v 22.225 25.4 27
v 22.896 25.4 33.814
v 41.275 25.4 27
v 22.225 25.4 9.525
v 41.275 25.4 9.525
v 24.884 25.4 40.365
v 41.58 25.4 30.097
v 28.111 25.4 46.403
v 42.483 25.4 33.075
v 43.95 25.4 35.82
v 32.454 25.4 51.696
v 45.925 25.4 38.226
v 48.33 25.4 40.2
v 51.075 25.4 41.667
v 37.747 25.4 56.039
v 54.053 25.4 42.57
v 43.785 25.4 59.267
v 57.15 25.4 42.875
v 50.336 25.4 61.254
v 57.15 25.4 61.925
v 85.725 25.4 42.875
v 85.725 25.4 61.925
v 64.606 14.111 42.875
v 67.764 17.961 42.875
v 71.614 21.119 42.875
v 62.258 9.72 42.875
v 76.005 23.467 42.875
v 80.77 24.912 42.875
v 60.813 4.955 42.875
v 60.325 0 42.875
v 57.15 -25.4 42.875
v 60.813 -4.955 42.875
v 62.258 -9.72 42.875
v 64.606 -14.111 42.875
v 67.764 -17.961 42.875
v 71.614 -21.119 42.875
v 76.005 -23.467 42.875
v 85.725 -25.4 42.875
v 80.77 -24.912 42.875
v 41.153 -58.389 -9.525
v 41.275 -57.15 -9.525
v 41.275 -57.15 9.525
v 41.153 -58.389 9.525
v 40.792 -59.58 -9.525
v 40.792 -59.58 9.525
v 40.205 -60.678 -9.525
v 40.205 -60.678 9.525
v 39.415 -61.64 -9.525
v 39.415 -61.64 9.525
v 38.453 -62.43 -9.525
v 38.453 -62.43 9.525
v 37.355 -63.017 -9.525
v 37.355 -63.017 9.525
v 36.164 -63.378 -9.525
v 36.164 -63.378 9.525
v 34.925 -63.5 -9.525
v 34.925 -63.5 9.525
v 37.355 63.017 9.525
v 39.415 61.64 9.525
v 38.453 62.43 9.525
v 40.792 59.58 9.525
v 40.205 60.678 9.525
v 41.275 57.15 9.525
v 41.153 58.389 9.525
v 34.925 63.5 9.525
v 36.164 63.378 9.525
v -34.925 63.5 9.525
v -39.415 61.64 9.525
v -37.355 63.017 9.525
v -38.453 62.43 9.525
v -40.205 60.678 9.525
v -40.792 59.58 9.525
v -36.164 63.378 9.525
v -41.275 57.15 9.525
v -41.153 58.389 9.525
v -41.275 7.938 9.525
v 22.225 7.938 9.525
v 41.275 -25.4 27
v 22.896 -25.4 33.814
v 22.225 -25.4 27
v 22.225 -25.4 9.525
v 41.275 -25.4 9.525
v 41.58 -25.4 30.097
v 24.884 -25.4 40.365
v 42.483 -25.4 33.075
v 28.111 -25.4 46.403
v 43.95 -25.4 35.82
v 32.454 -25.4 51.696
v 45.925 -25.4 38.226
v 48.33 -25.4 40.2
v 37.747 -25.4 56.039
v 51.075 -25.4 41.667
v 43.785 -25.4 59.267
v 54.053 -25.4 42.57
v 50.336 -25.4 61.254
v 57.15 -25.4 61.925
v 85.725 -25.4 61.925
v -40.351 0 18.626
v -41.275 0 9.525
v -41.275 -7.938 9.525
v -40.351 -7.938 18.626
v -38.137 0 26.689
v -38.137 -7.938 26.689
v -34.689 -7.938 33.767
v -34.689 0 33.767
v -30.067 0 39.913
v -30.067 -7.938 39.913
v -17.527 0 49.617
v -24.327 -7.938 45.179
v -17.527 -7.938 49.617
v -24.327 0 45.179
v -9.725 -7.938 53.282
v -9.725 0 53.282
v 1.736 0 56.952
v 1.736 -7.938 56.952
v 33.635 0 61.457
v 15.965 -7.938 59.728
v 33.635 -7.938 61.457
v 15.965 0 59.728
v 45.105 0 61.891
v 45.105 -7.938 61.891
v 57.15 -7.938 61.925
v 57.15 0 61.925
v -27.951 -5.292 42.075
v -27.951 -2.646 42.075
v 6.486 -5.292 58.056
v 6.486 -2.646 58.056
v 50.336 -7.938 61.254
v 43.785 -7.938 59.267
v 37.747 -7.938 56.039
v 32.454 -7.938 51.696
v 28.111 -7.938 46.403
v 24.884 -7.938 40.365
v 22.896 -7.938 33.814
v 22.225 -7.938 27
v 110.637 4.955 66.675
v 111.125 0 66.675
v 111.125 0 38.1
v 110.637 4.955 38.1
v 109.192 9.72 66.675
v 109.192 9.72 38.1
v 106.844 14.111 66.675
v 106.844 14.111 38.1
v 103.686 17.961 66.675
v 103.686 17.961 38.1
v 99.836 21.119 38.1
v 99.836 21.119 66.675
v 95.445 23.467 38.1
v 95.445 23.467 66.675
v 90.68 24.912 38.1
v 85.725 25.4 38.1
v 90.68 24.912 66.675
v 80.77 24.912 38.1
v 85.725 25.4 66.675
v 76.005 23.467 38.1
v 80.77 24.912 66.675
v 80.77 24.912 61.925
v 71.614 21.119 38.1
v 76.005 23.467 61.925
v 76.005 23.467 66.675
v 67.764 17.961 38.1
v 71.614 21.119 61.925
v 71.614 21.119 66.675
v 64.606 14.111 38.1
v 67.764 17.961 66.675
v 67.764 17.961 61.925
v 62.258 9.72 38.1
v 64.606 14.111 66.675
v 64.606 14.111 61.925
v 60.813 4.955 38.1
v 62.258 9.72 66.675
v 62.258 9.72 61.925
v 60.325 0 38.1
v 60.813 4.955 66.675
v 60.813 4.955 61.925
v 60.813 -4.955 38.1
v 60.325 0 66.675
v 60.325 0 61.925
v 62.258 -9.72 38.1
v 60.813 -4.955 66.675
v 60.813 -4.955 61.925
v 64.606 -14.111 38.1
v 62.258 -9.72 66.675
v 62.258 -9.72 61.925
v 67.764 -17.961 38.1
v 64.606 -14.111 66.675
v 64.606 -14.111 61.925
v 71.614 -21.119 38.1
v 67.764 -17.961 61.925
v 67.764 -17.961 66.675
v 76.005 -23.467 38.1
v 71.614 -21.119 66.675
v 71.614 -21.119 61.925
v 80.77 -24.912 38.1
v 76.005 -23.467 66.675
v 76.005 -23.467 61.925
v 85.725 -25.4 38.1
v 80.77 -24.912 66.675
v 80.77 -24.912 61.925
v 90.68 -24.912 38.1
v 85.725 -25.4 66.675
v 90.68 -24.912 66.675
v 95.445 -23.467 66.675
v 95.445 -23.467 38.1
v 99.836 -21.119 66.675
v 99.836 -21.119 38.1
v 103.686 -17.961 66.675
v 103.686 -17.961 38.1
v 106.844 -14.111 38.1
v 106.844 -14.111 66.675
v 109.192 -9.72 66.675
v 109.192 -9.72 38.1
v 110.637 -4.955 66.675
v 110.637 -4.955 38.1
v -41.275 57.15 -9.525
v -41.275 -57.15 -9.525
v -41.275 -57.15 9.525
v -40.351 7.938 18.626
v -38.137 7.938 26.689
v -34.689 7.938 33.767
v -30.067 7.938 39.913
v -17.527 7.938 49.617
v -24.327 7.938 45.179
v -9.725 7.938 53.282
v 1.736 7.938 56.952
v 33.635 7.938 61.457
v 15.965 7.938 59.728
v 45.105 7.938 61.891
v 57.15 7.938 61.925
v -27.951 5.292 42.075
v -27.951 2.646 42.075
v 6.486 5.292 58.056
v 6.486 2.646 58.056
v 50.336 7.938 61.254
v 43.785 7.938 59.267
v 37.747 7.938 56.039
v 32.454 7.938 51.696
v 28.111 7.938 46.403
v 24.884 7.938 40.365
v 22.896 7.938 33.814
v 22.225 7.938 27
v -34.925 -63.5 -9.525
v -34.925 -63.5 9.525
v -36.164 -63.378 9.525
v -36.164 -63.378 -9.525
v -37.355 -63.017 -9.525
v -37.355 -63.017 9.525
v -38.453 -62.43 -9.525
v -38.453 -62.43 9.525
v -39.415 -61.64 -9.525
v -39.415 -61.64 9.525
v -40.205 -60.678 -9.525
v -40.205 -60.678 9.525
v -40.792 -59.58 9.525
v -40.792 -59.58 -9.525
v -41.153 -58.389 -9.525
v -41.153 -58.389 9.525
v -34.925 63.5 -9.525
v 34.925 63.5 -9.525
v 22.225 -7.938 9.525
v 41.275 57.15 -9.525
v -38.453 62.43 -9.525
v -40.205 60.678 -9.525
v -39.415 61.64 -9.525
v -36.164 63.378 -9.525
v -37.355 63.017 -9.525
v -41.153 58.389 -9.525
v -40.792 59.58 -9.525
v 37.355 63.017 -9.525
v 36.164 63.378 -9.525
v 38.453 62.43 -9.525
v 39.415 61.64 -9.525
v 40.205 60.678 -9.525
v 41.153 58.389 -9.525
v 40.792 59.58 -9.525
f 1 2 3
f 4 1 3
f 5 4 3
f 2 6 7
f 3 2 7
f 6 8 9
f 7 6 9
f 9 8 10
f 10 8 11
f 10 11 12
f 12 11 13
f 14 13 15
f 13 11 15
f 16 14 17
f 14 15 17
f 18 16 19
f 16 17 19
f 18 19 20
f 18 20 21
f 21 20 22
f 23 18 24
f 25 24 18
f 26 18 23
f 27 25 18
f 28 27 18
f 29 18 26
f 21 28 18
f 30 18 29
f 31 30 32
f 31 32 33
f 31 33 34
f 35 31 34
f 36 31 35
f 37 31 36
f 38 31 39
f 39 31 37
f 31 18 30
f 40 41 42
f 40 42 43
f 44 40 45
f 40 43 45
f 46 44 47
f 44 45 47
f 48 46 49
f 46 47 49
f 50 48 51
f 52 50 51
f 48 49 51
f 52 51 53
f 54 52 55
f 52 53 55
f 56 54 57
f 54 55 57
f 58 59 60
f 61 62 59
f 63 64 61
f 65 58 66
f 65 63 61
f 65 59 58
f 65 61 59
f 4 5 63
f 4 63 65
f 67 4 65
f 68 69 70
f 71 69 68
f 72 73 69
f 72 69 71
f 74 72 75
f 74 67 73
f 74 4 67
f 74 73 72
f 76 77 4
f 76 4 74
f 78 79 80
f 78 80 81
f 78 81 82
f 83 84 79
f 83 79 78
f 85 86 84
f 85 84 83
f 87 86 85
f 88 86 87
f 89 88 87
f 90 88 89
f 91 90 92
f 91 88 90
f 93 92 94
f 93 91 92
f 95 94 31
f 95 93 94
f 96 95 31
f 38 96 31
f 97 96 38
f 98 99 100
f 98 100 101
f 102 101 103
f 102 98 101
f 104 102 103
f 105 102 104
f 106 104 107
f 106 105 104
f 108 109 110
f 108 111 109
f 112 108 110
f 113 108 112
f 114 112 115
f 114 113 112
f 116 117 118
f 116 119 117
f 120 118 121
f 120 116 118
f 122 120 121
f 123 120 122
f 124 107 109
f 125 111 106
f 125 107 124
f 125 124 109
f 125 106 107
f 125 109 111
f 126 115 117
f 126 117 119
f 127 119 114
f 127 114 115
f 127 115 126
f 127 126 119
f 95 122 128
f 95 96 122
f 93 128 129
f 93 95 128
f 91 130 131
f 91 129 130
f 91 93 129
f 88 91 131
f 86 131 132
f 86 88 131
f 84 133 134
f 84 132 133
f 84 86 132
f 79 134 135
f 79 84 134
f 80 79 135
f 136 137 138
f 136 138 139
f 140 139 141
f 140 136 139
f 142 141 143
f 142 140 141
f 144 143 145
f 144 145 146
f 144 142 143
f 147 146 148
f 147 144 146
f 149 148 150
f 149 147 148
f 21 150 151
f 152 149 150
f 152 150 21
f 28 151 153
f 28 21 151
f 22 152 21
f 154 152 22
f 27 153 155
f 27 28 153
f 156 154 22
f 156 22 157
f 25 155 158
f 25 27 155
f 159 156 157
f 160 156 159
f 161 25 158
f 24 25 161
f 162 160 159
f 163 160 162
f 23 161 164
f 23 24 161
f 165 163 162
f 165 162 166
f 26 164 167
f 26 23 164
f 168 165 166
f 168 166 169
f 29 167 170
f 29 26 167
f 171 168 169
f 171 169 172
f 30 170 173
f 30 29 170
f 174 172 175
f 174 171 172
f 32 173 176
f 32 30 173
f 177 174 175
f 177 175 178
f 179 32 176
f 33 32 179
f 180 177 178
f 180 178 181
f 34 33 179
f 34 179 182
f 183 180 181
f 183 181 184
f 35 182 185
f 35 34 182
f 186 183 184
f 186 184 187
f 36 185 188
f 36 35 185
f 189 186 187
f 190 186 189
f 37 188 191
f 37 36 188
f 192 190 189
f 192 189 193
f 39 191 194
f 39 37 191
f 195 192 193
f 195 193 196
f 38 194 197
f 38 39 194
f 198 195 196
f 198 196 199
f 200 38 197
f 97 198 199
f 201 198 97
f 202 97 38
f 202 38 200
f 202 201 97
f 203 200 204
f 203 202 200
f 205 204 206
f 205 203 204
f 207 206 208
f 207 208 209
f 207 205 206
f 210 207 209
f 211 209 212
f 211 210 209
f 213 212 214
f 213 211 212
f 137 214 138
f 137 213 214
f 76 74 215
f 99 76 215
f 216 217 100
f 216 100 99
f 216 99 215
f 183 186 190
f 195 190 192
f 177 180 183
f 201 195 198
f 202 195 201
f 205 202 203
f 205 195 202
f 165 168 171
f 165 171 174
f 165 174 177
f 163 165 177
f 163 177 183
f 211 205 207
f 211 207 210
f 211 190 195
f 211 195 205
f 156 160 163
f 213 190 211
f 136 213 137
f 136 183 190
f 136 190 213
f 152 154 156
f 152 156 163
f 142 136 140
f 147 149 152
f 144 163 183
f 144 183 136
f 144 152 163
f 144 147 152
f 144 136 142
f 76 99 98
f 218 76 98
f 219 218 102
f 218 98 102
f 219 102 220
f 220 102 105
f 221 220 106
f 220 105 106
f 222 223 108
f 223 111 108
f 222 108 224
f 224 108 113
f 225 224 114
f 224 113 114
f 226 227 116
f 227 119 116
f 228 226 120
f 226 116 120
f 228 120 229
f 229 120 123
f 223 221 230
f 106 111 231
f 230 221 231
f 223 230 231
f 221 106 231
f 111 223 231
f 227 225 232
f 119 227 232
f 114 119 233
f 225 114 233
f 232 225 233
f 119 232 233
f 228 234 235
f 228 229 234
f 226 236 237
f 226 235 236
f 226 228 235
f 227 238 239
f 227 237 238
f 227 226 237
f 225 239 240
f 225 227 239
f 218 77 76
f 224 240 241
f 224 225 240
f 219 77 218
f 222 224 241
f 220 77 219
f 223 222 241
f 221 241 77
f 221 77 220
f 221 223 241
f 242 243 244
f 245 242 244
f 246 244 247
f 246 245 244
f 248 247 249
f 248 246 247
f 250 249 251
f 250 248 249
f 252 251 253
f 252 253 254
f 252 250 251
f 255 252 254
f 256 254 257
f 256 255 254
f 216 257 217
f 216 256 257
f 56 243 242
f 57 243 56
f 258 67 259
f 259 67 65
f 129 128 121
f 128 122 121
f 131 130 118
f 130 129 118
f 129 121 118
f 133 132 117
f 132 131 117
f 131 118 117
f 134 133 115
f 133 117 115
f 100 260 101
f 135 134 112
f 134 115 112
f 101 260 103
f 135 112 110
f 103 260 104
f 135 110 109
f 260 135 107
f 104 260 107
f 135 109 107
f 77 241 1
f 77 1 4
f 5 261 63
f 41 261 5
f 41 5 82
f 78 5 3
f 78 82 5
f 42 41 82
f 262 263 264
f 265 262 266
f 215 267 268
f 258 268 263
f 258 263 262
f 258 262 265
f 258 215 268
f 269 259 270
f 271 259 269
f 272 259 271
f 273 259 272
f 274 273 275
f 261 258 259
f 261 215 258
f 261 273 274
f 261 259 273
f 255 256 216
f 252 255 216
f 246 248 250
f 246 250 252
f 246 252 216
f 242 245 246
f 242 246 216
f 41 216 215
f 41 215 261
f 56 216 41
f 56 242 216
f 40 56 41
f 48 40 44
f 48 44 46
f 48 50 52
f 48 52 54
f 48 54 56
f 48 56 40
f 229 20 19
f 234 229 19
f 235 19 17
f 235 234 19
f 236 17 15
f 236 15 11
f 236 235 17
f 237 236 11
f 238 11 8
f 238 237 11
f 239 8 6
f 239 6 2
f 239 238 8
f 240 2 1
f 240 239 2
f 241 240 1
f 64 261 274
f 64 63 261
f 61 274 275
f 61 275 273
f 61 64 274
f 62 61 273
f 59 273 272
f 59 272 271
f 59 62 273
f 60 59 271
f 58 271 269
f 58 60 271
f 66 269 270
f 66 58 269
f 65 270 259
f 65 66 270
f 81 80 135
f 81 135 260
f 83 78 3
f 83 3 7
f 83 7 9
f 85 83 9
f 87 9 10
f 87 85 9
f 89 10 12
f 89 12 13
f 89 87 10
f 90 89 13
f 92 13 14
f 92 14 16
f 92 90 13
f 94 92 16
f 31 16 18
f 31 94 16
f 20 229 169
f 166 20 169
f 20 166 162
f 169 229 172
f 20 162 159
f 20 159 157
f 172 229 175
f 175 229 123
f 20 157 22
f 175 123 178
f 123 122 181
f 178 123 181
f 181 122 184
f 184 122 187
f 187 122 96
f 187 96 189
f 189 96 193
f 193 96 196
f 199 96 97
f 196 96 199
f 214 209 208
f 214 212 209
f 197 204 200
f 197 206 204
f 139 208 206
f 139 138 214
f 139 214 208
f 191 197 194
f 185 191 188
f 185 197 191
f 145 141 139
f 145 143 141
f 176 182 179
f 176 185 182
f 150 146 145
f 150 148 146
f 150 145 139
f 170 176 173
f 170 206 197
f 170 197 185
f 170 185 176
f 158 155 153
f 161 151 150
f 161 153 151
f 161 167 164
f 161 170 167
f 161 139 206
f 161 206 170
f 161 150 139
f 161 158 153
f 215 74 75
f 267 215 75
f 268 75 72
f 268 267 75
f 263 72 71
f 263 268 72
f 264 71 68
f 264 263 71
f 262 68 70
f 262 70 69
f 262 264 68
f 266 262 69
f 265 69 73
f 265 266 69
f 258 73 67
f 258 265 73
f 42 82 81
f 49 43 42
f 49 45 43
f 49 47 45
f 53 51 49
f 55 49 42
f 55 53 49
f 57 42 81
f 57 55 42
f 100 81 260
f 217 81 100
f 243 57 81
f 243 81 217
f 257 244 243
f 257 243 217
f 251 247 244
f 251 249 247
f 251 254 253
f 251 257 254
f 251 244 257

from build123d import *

# Parameters (mm, degrees)
F1_DEPTH = 63.5
F2_DEPTH = 25.4
F0_W     = 25.4
F0_H     = 19.05
F3_DEPTH = 25.4
F4_DEPTH = 7.9375
F6_R     = 6.35


with BuildPart() as f1:
    # F0 (on Front) → F1 (new body, symmetric)
    with BuildSketch(Plane.XZ):
        Polygon((22.225, 9.525), (-41.275, 9.525), (-41.275, -9.525), (41.275, -9.525), (41.275, 9.525), align=None)
    extrude(amount=F1_DEPTH, both=True)

    # F0 (on Front) → F2 (join, symmetric)
    with BuildSketch(Plane.XZ):
        with BuildLine():
            Line((22.225, 27.0002), (22.225, 9.525))
            Line((22.225, 9.525), (41.275, 9.525))
            Line((41.275, 9.525), (41.275, 27.0002))
            ThreePointArc((41.275, 27.0002), (45.9246798487, 38.2255201513), (57.15, 42.8752))
            Line((57.15, 42.8752), (60.325, 42.8752))
            Line((60.325, 42.8752), (60.325, 61.9252))
            Line((60.325, 61.9252), (57.15, 61.9252))
            ThreePointArc((57.15, 61.9252), (32.4542956671, 51.6959043329), (22.225, 27.0002))
        make_face()
    extrude(amount=F2_DEPTH, both=True)

    # F0 (on Front) → F3 (join, symmetric)
    with BuildSketch(Plane.XZ):
        with Locations((73.025, 52.4002)):
            Rectangle(F0_W, F0_H)
    extrude(amount=F3_DEPTH, both=True)

    # F0 (on Front) → F4 (join, symmetric)
    with BuildSketch(Plane.XZ):
        with BuildLine():
            add(Edge.make_bspline(
                [(-41.275, 9.525), (-40.1356369257, 51.84443295), (0, 62.6272857189), (57.15, 61.9252)],
                knots=[0, 0, 0, 0, 111.5045361635, 111.5045361635, 111.5045361635, 111.5045361635], degree=3))
            Line((-41.275, 9.525), (22.225, 9.525))
            Line((22.225, 9.525), (22.225, 27.0002))
            ThreePointArc((22.225, 27.0002), (32.4542956671, 51.6959043329), (57.15, 61.9252))
        make_face()
    extrude(amount=F4_DEPTH, both=True)

    # F0 (on Front) → F5 (revolve)
    with BuildSketch(Plane.XZ):
        Polygon((85.725, 66.675), (85.725, 61.9252), (85.725, 42.8752), (85.725, 38.1), (111.125, 38.1), (111.125, 66.675), align=None)
    revolve(axis=Axis((85.725, 0, 52.3875), (0, 0, 1)))

    # F6
    f6_edges = [f1.edges().sort_by_distance(p)[0] for p in [
        (41.275, -63.5, 0),
        (-41.275, -63.5, 0),
        (41.275, 63.5, 0),
        (-41.275, 63.5, 0),
    ]]
    fillet(f6_edges, radius=F6_R)


solid = f1.part
